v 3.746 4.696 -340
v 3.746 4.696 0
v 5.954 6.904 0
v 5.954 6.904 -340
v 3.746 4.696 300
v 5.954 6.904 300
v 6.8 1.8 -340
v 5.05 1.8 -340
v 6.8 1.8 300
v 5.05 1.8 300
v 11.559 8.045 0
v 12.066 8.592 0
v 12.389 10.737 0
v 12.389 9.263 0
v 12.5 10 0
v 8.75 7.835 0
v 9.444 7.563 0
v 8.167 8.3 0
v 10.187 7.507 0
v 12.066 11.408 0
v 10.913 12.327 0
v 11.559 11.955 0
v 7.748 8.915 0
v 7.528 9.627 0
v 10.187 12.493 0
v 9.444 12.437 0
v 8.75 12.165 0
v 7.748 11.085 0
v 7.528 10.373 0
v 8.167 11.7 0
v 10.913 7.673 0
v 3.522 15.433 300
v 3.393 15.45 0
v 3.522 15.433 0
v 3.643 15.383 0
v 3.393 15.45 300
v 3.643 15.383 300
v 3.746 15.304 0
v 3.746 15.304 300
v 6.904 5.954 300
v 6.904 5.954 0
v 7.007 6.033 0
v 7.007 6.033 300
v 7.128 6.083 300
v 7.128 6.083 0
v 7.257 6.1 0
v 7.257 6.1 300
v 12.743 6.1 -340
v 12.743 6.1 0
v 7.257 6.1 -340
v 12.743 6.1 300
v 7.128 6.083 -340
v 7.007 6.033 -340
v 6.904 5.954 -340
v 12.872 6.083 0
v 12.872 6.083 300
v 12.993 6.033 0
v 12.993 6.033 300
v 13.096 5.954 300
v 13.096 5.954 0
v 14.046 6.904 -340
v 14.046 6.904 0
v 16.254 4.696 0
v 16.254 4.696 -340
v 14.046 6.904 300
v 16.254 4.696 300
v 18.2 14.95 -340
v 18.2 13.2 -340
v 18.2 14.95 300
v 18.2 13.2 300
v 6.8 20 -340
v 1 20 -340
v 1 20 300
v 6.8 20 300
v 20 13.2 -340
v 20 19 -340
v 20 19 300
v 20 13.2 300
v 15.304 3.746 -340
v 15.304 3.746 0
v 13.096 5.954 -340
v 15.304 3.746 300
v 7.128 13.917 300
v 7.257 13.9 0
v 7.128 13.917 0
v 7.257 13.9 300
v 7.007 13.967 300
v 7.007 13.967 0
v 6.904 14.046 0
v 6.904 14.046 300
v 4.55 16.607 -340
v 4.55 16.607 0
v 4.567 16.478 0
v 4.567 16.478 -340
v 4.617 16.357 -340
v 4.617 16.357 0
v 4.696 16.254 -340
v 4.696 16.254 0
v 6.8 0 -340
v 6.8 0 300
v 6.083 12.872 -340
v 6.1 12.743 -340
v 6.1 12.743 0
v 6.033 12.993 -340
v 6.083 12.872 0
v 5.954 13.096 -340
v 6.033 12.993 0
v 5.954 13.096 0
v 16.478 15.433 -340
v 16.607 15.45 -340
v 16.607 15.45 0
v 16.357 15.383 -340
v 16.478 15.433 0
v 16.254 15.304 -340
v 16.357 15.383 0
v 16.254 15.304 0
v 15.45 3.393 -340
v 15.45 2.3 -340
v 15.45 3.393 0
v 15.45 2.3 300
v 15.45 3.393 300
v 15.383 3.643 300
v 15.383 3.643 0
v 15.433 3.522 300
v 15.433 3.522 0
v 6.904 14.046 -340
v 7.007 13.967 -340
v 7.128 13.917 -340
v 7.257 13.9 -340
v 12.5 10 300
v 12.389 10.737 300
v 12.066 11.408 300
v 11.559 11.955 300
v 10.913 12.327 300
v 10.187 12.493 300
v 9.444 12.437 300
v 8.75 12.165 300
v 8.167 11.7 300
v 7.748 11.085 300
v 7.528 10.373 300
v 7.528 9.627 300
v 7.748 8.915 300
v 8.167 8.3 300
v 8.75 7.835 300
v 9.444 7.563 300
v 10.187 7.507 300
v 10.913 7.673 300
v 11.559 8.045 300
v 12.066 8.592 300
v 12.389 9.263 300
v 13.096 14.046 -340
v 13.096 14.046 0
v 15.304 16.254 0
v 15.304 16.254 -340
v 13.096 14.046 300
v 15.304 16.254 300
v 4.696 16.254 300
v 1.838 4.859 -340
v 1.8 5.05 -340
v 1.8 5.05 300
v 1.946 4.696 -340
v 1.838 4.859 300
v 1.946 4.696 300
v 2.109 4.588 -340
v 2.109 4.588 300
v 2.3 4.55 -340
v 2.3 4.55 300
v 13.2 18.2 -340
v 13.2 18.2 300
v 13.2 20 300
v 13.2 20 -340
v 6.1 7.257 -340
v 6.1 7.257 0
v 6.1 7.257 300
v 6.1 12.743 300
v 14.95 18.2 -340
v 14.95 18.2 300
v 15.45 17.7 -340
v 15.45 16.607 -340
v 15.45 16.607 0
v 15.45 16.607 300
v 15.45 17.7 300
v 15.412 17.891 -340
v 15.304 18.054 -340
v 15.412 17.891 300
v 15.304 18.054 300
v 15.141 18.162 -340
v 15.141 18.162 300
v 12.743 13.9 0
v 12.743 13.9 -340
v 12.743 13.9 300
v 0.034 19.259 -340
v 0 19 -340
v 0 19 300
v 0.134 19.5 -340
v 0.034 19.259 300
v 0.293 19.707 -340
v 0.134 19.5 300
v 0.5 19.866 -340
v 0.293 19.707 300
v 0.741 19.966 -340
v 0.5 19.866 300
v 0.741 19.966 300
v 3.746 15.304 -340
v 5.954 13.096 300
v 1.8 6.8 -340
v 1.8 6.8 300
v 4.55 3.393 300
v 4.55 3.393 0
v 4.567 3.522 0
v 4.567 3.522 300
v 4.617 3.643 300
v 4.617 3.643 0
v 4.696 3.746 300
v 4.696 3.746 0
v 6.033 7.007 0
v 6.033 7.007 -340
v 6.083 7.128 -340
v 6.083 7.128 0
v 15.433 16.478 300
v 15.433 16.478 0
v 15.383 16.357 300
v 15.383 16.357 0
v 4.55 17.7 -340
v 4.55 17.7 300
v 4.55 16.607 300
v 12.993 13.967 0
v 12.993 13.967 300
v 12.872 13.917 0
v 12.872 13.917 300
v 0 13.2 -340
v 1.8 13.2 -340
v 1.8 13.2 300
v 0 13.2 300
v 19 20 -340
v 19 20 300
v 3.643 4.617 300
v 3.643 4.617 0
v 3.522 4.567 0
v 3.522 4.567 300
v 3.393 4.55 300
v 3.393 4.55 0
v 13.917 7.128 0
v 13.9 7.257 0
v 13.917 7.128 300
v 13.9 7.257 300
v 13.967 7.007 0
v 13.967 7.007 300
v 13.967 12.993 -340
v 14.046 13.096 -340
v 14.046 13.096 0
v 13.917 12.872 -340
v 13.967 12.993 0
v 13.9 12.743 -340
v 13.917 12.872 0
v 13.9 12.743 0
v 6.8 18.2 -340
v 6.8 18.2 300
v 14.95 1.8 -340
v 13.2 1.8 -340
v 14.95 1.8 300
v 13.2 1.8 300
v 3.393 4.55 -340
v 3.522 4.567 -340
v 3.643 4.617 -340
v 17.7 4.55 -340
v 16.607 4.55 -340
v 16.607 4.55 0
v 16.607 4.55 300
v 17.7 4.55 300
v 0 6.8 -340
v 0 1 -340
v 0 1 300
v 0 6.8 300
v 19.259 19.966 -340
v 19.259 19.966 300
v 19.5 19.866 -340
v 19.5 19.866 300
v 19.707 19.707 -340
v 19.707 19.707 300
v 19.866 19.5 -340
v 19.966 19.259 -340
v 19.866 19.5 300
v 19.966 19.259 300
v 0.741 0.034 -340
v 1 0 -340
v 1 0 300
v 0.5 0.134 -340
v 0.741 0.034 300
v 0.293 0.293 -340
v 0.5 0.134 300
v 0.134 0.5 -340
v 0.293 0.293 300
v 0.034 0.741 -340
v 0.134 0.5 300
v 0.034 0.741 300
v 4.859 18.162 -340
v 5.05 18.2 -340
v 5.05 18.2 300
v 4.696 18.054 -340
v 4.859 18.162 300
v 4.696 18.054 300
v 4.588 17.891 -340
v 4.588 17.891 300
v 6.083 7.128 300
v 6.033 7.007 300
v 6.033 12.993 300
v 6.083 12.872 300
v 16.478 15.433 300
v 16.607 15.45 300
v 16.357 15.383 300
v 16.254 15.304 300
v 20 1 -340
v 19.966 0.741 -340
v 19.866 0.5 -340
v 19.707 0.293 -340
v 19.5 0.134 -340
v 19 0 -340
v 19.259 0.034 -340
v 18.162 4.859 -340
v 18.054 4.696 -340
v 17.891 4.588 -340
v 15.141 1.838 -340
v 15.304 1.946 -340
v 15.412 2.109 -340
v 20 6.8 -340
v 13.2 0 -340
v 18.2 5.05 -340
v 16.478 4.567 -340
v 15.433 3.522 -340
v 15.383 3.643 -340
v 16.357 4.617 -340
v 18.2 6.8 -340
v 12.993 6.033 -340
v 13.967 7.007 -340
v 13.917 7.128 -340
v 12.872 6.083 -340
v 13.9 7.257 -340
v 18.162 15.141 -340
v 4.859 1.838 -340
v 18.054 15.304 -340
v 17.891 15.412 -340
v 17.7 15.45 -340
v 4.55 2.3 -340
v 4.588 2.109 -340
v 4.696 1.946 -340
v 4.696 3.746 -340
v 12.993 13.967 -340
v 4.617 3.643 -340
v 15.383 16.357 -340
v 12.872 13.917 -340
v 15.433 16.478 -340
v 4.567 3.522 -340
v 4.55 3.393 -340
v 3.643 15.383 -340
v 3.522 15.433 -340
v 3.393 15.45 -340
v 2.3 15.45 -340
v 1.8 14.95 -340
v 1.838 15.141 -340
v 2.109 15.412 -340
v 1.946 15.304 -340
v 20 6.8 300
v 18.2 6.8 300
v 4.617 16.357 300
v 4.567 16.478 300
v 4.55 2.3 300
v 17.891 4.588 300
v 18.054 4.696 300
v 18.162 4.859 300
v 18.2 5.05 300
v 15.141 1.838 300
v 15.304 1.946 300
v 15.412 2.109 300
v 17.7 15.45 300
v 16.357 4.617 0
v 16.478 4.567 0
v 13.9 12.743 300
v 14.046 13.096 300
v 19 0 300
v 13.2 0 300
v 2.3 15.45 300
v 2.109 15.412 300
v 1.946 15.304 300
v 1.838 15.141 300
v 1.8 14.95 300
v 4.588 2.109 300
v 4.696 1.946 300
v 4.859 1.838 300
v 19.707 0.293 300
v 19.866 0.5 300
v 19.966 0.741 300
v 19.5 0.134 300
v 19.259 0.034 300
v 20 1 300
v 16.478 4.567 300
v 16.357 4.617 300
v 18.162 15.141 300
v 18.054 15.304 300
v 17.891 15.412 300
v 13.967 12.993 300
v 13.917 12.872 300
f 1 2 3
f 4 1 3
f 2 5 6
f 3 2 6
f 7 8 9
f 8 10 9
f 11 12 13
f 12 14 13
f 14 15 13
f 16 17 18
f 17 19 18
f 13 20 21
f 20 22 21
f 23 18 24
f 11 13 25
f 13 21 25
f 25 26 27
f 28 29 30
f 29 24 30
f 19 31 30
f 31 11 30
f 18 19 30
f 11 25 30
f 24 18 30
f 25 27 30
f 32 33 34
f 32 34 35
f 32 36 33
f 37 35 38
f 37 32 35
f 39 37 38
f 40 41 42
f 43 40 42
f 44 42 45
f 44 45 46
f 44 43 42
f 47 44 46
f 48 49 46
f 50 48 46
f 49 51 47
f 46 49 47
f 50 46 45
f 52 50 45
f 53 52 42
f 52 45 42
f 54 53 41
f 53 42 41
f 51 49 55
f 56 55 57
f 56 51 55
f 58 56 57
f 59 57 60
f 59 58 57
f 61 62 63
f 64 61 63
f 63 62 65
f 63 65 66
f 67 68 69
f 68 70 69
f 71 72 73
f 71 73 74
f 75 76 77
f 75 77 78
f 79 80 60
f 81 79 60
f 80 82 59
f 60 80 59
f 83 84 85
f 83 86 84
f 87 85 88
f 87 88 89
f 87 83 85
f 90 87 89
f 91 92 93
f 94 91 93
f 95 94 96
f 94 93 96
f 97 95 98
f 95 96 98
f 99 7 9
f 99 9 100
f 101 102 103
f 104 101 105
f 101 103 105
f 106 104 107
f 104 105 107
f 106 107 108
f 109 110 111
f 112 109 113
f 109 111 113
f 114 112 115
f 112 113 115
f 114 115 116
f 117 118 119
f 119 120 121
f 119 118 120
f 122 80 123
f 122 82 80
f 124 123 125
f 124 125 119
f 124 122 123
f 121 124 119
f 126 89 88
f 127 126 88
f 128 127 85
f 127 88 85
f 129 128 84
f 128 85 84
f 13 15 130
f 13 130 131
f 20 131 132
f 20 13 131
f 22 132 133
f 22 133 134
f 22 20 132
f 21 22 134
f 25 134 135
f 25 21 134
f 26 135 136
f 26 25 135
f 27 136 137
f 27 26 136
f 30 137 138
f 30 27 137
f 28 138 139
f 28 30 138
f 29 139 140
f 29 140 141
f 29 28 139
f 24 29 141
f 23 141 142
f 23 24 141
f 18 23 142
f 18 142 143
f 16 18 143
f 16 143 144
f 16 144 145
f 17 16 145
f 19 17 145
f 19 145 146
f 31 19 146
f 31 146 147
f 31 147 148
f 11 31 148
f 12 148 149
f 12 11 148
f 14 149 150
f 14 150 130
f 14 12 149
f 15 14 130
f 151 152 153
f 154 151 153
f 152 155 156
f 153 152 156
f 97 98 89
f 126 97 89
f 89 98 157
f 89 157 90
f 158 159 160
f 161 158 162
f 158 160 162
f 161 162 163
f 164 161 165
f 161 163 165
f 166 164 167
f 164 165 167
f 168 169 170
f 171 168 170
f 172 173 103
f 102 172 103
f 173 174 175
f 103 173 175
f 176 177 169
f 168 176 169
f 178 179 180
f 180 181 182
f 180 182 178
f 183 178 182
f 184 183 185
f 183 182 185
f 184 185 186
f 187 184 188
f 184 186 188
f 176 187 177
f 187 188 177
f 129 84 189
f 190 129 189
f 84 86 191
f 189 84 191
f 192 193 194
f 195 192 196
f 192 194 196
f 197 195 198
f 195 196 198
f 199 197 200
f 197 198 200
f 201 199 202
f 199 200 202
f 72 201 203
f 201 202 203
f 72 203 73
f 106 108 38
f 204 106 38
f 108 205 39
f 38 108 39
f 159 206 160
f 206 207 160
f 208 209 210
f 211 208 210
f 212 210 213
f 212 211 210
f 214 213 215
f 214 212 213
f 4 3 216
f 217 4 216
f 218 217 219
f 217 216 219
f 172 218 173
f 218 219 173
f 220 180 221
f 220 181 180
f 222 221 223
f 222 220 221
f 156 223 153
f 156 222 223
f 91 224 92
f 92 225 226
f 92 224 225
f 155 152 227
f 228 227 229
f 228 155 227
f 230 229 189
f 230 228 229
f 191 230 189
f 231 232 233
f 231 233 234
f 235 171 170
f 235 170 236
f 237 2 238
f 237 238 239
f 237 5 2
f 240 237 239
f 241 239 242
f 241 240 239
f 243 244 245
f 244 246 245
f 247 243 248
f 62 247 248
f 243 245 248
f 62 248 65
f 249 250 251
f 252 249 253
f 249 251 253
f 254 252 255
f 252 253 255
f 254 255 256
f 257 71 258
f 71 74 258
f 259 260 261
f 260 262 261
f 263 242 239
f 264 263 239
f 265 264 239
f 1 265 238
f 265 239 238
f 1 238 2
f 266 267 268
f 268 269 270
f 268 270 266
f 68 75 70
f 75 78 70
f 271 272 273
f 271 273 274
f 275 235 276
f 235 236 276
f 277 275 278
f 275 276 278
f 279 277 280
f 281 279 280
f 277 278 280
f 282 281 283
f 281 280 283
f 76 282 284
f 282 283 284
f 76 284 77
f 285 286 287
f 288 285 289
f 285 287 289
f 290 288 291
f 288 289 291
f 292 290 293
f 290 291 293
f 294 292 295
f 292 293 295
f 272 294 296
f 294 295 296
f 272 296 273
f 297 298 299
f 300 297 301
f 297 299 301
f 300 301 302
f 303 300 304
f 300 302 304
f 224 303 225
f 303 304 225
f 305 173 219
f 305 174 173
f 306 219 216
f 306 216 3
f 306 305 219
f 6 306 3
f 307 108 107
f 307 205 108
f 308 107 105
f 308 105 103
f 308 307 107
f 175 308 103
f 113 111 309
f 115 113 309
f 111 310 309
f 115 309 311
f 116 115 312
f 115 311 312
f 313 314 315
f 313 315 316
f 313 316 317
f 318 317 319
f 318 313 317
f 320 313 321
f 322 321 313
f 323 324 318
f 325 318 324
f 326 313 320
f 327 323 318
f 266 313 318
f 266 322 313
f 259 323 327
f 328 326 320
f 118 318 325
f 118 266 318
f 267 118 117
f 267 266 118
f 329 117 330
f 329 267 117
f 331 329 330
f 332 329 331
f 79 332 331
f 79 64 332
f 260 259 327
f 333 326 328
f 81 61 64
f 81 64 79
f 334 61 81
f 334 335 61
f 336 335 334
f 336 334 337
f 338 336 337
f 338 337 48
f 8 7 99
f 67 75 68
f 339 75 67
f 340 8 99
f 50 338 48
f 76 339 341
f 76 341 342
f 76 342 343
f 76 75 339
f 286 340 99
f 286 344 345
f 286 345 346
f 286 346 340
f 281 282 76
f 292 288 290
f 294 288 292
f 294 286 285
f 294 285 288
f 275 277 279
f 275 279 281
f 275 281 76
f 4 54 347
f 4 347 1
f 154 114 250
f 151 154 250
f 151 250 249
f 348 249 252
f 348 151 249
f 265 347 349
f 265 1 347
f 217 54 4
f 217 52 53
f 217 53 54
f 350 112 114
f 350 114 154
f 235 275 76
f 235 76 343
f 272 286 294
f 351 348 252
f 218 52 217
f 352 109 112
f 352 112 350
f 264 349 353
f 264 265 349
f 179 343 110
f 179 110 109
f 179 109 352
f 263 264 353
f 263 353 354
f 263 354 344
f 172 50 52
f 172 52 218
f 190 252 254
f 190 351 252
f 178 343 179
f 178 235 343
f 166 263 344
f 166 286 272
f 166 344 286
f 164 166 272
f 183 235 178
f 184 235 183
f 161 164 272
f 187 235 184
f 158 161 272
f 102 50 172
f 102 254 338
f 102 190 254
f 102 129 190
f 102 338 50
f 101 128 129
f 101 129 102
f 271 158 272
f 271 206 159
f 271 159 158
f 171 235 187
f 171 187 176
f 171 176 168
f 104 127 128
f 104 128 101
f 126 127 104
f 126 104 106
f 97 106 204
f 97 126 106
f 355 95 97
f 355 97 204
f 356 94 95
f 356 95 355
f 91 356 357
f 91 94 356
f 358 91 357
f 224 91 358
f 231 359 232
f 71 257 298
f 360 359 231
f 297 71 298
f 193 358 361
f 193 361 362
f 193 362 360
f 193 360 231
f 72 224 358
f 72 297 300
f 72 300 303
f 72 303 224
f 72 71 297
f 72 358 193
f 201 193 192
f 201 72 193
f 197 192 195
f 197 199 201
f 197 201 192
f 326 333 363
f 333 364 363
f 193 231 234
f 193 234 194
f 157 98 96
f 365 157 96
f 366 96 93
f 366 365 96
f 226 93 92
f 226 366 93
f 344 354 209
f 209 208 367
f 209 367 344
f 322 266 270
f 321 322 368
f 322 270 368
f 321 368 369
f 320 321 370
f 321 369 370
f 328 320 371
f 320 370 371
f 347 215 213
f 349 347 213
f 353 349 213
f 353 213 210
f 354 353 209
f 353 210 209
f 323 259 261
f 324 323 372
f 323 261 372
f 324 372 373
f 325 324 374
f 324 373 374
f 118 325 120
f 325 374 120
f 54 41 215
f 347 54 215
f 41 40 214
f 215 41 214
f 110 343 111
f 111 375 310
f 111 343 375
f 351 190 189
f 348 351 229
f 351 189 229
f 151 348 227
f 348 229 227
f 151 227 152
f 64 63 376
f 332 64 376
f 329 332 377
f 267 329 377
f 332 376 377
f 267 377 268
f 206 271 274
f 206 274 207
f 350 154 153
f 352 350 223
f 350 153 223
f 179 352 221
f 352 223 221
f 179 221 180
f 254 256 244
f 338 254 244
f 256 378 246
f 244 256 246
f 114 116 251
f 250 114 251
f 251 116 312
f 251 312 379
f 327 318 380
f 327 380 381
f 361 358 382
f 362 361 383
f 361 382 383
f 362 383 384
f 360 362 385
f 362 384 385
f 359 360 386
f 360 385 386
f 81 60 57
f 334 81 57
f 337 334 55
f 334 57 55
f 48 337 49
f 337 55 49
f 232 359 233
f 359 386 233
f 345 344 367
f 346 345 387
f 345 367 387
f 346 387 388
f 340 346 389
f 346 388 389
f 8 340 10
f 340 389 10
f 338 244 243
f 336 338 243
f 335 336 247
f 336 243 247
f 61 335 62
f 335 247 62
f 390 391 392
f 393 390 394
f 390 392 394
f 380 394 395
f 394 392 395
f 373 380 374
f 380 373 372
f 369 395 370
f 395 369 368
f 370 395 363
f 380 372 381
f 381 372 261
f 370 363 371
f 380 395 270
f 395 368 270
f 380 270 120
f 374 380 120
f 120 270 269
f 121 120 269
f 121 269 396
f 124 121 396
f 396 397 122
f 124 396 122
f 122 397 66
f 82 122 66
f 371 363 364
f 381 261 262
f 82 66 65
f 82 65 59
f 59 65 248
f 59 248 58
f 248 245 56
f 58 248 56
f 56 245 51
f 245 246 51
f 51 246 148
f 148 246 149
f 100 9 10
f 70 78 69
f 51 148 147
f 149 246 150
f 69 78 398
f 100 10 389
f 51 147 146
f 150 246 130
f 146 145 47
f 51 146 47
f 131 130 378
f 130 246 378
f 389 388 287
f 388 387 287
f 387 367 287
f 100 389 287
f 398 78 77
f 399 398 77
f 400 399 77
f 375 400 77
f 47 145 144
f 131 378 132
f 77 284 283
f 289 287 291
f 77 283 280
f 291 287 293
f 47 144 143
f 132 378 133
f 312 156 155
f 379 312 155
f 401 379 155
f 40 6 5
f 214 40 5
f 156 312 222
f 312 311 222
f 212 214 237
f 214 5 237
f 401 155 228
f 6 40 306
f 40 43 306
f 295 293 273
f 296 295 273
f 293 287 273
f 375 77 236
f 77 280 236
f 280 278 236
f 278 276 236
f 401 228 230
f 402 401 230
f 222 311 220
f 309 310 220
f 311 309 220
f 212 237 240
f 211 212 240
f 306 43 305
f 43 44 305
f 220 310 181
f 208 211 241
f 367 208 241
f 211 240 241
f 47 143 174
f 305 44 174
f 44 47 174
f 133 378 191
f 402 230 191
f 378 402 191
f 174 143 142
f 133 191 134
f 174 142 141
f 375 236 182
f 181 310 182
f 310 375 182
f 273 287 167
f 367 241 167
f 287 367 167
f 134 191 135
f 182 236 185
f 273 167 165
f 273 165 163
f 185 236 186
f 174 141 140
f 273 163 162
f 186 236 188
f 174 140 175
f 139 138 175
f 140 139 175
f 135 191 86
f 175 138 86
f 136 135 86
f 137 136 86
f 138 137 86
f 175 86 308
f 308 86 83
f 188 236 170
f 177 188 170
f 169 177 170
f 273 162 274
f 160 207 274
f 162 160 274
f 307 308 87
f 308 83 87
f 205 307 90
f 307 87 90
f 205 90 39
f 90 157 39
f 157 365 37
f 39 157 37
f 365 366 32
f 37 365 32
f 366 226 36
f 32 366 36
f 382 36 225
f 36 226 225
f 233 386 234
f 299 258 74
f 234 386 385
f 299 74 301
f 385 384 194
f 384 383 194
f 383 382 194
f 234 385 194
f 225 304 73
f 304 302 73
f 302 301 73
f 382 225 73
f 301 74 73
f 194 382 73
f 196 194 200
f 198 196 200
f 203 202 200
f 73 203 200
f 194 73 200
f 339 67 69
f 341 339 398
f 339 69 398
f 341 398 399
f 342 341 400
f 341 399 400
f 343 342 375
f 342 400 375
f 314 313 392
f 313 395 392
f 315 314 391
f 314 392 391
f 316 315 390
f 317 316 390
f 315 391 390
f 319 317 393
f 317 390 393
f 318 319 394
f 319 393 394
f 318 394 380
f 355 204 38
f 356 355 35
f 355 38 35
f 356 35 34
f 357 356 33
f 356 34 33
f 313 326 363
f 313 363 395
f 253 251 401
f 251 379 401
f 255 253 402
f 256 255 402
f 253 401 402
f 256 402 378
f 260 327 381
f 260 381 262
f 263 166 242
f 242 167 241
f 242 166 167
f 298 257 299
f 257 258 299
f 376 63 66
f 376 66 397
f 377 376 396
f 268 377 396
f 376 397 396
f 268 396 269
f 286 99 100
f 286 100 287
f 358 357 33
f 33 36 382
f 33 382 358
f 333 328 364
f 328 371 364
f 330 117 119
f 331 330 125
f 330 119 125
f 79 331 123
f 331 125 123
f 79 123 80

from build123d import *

# Parameters (mm, degrees)
SKETCH1_R           = 2.5
BOSS_EXTRUDE1_DEPTH = 300
FILLET1_R           = 1
FILLET2_R           = 0.5
FILLET3_R           = 0.5
FILLET4_R           = 0.5
FILLET5_R           = 0.5
BOSS_EXTRUDE2_DEPTH = 340


with BuildPart() as part:
    # Sketch1 → Boss-Extrude1 (new body)
    with BuildSketch(Plane.XY):
        Polygon((13.2, 0), (13.2, 1.8), (15.45, 1.8), (15.45, 3.6), (12.95, 6.1), (7.05, 6.1), (4.55, 3.6), (4.55, 1.8), (6.8, 1.8), (6.8, 0), (0, 0), (0, 6.8), (1.8, 6.8), (1.8, 4.55), (3.6, 4.55), (6.1, 7.05), (6.1, 12.95), (3.6, 15.45), (1.8, 15.45), (1.8, 13.2), (0, 13.2), (0, 20), (6.8, 20), (6.8, 18.2), (4.55, 18.2), (4.55, 16.4), (7.05, 13.9), (12.95, 13.9), (15.45, 16.4), (15.45, 18.2), (13.2, 18.2), (13.2, 20), (20, 20), (20, 13.2), (18.2, 13.2), (18.2, 15.45), (16.4, 15.45), (13.9, 12.95), (13.9, 7.05), (16.4, 4.55), (18.2, 4.55), (18.2, 6.8), (20, 6.8), (20, 0), align=None)
        with Locations((10, 10)):
            Circle(SKETCH1_R, mode=Mode.SUBTRACT)
    extrude(amount=BOSS_EXTRUDE1_DEPTH)

    # Fillet1
    fillet1_edges = [part.edges().sort_by_distance(p)[0] for p in [
        (0, 0, 150),
        (0, 20, 150),
        (20, 20, 150),
        (20, 0, 150),
    ]]
    fillet(fillet1_edges, radius=FILLET1_R)

    # Fillet2
    fillet2_edges = [part.edges().sort_by_distance(p)[0] for p in [
        (4.55, 18.2, 150),
        (4.55, 16.4, 150),
        (7.05, 13.9, 150),
        (12.95, 13.9, 150),
        (15.45, 16.4, 150),
        (15.45, 18.2, 150),
    ]]
    fillet(fillet2_edges, radius=FILLET2_R)

    # Fillet3
    fillet3_edges = [part.edges().sort_by_distance(p)[0] for p in [
        (18.2, 15.45, 150),
        (16.4, 15.45, 150),
        (13.9, 12.95, 150),
        (13.9, 7.05, 150),
        (16.4, 4.55, 150),
        (18.2, 4.55, 150),
    ]]
    fillet(fillet3_edges, radius=FILLET3_R)

    # Fillet4
    fillet4_edges = [part.edges().sort_by_distance(p)[0] for p in [
        (1.8, 4.55, 150),
        (3.6, 4.55, 150),
        (6.1, 7.05, 150),
        (6.1, 12.95, 150),
        (3.6, 15.45, 150),
        (1.8, 15.45, 150),
    ]]
    fillet(fillet4_edges, radius=FILLET4_R)

    # Fillet5
    fillet5_edges = [part.edges().sort_by_distance(p)[0] for p in [
        (15.45, 1.8, 150),
        (15.45, 3.6, 150),
        (12.95, 6.1, 150),
        (7.05, 6.1, 150),
        (4.55, 3.6, 150),
        (4.55, 1.8, 150),
    ]]
    fillet(fillet5_edges, radius=FILLET5_R)

    # Sketch4 → Boss-Extrude2 (add)
    with BuildSketch(Plane(origin=(0, 0, 0), x_dir=(-1, 0, 0), z_dir=(0, 0, -1))):
        with BuildLine():
            Line((-13.2, 20), (-19, 20))
            ThreePointArc((-19, 20), (-19.707106781, 19.707106781), (-20, 19))
            Line((-20, 19), (-20, 13.2))
            Line((-20, 13.2), (-18.2, 13.2))
            Line((-18.2, 13.2), (-18.2, 14.95))
            ThreePointArc((-18.2, 14.95), (-18.053553391, 15.303553391), (-17.7, 15.45))
            Line((-17.7, 15.45), (-16.607106781, 15.45))
            ThreePointArc((-16.607106781, 15.45), (-16.415765065, 15.411939766), (-16.253553391, 15.303553391))
            Line((-16.253553391, 15.303553391), (-14.046446609, 13.096446609))
            ThreePointArc((-14.046446609, 13.096446609), (-13.938060234, 12.934234935), (-13.9, 12.742893219))
            Line((-13.9, 12.742893219), (-13.9, 7.257106781))
            ThreePointArc((-13.9, 7.257106781), (-13.938060234, 7.065765065), (-14.046446609, 6.903553391))
            Line((-14.046446609, 6.903553391), (-16.253553391, 4.696446609))
            ThreePointArc((-16.253553391, 4.696446609), (-16.415765065, 4.588060234), (-16.607106781, 4.55))
            Line((-16.607106781, 4.55), (-17.7, 4.55))
            ThreePointArc((-17.7, 4.55), (-18.053553391, 4.696446609), (-18.2, 5.05))
            Line((-18.2, 5.05), (-18.2, 6.8))
            Line((-18.2, 6.8), (-20, 6.8))
            Line((-20, 6.8), (-20, 1))
            ThreePointArc((-20, 1), (-19.707106781, 0.292893219), (-19, 0))
            Line((-19, 0), (-13.2, 0))
            Line((-13.2, 0), (-13.2, 1.8))
            Line((-13.2, 1.8), (-14.95, 1.8))
            ThreePointArc((-14.95, 1.8), (-15.303553391, 1.946446609), (-15.45, 2.3))
            Line((-15.45, 2.3), (-15.45, 3.392893219))
            ThreePointArc((-15.45, 3.392893219), (-15.411939766, 3.584234935), (-15.303553391, 3.746446609))
            Line((-15.303553391, 3.746446609), (-13.096446609, 5.953553391))
            ThreePointArc((-13.096446609, 5.953553391), (-12.934234935, 6.061939766), (-12.742893219, 6.1))
            Line((-12.742893219, 6.1), (-7.257106781, 6.1))
            ThreePointArc((-7.257106781, 6.1), (-7.065765065, 6.061939766), (-6.903553391, 5.953553391))
            Line((-6.903553391, 5.953553391), (-4.696446609, 3.746446609))
            ThreePointArc((-4.696446609, 3.746446609), (-4.588060234, 3.584234935), (-4.55, 3.392893219))
            Line((-4.55, 3.392893219), (-4.55, 2.3))
            ThreePointArc((-4.55, 2.3), (-4.696446609, 1.946446609), (-5.05, 1.8))
            Line((-5.05, 1.8), (-6.8, 1.8))
            Line((-6.8, 1.8), (-6.8, 0))
            Line((-6.8, 0), (-1, 0))
            ThreePointArc((-1, 0), (-0.292893219, 0.292893219), (0, 1))
            Line((0, 1), (0, 6.8))
            Line((0, 6.8), (-1.8, 6.8))
            Line((-1.8, 6.8), (-1.8, 5.05))
            ThreePointArc((-1.8, 5.05), (-1.946446609, 4.696446609), (-2.3, 4.55))
            Line((-2.3, 4.55), (-3.392893219, 4.55))
            ThreePointArc((-3.392893219, 4.55), (-3.584234935, 4.588060234), (-3.746446609, 4.696446609))
            Line((-3.746446609, 4.696446609), (-5.953553391, 6.903553391))
            ThreePointArc((-5.953553391, 6.903553391), (-6.061939766, 7.065765065), (-6.1, 7.257106781))
            Line((-6.1, 7.257106781), (-6.1, 12.742893219))
            ThreePointArc((-6.1, 12.742893219), (-6.061939766, 12.934234935), (-5.953553391, 13.096446609))
            Line((-5.953553391, 13.096446609), (-3.746446609, 15.303553391))
            ThreePointArc((-3.746446609, 15.303553391), (-3.584234935, 15.411939766), (-3.392893219, 15.45))
            Line((-3.392893219, 15.45), (-2.3, 15.45))
            ThreePointArc((-2.3, 15.45), (-1.946446609, 15.303553391), (-1.8, 14.95))
            Line((-1.8, 14.95), (-1.8, 13.2))
            Line((-1.8, 13.2), (0, 13.2))
            Line((0, 13.2), (0, 19))
            ThreePointArc((0, 19), (-0.292893219, 19.707106781), (-1, 20))
            Line((-1, 20), (-6.8, 20))
            Line((-6.8, 20), (-6.8, 18.2))
            Line((-6.8, 18.2), (-5.05, 18.2))
            ThreePointArc((-5.05, 18.2), (-4.696446609, 18.053553391), (-4.55, 17.7))
            Line((-4.55, 17.7), (-4.55, 16.607106781))
            ThreePointArc((-4.55, 16.607106781), (-4.588060234, 16.415765065), (-4.696446609, 16.253553391))
            Line((-4.696446609, 16.253553391), (-6.903553391, 14.046446609))
            ThreePointArc((-6.903553391, 14.046446609), (-7.065765065, 13.938060234), (-7.257106781, 13.9))
            Line((-7.257106781, 13.9), (-12.742893219, 13.9))
            ThreePointArc((-12.742893219, 13.9), (-12.934234935, 13.938060234), (-13.096446609, 14.046446609))
            Line((-13.096446609, 14.046446609), (-15.303553391, 16.253553391))
            ThreePointArc((-15.303553391, 16.253553391), (-15.411939766, 16.415765065), (-15.45, 16.607106781))
            Line((-15.45, 16.607106781), (-15.45, 17.7))
            ThreePointArc((-15.45, 17.7), (-15.303553391, 18.053553391), (-14.95, 18.2))
            Line((-14.95, 18.2), (-13.2, 18.2))
            Line((-13.2, 18.2), (-13.2, 20))
        make_face()
    extrude(amount=BOSS_EXTRUDE2_DEPTH)


solid = part.part
